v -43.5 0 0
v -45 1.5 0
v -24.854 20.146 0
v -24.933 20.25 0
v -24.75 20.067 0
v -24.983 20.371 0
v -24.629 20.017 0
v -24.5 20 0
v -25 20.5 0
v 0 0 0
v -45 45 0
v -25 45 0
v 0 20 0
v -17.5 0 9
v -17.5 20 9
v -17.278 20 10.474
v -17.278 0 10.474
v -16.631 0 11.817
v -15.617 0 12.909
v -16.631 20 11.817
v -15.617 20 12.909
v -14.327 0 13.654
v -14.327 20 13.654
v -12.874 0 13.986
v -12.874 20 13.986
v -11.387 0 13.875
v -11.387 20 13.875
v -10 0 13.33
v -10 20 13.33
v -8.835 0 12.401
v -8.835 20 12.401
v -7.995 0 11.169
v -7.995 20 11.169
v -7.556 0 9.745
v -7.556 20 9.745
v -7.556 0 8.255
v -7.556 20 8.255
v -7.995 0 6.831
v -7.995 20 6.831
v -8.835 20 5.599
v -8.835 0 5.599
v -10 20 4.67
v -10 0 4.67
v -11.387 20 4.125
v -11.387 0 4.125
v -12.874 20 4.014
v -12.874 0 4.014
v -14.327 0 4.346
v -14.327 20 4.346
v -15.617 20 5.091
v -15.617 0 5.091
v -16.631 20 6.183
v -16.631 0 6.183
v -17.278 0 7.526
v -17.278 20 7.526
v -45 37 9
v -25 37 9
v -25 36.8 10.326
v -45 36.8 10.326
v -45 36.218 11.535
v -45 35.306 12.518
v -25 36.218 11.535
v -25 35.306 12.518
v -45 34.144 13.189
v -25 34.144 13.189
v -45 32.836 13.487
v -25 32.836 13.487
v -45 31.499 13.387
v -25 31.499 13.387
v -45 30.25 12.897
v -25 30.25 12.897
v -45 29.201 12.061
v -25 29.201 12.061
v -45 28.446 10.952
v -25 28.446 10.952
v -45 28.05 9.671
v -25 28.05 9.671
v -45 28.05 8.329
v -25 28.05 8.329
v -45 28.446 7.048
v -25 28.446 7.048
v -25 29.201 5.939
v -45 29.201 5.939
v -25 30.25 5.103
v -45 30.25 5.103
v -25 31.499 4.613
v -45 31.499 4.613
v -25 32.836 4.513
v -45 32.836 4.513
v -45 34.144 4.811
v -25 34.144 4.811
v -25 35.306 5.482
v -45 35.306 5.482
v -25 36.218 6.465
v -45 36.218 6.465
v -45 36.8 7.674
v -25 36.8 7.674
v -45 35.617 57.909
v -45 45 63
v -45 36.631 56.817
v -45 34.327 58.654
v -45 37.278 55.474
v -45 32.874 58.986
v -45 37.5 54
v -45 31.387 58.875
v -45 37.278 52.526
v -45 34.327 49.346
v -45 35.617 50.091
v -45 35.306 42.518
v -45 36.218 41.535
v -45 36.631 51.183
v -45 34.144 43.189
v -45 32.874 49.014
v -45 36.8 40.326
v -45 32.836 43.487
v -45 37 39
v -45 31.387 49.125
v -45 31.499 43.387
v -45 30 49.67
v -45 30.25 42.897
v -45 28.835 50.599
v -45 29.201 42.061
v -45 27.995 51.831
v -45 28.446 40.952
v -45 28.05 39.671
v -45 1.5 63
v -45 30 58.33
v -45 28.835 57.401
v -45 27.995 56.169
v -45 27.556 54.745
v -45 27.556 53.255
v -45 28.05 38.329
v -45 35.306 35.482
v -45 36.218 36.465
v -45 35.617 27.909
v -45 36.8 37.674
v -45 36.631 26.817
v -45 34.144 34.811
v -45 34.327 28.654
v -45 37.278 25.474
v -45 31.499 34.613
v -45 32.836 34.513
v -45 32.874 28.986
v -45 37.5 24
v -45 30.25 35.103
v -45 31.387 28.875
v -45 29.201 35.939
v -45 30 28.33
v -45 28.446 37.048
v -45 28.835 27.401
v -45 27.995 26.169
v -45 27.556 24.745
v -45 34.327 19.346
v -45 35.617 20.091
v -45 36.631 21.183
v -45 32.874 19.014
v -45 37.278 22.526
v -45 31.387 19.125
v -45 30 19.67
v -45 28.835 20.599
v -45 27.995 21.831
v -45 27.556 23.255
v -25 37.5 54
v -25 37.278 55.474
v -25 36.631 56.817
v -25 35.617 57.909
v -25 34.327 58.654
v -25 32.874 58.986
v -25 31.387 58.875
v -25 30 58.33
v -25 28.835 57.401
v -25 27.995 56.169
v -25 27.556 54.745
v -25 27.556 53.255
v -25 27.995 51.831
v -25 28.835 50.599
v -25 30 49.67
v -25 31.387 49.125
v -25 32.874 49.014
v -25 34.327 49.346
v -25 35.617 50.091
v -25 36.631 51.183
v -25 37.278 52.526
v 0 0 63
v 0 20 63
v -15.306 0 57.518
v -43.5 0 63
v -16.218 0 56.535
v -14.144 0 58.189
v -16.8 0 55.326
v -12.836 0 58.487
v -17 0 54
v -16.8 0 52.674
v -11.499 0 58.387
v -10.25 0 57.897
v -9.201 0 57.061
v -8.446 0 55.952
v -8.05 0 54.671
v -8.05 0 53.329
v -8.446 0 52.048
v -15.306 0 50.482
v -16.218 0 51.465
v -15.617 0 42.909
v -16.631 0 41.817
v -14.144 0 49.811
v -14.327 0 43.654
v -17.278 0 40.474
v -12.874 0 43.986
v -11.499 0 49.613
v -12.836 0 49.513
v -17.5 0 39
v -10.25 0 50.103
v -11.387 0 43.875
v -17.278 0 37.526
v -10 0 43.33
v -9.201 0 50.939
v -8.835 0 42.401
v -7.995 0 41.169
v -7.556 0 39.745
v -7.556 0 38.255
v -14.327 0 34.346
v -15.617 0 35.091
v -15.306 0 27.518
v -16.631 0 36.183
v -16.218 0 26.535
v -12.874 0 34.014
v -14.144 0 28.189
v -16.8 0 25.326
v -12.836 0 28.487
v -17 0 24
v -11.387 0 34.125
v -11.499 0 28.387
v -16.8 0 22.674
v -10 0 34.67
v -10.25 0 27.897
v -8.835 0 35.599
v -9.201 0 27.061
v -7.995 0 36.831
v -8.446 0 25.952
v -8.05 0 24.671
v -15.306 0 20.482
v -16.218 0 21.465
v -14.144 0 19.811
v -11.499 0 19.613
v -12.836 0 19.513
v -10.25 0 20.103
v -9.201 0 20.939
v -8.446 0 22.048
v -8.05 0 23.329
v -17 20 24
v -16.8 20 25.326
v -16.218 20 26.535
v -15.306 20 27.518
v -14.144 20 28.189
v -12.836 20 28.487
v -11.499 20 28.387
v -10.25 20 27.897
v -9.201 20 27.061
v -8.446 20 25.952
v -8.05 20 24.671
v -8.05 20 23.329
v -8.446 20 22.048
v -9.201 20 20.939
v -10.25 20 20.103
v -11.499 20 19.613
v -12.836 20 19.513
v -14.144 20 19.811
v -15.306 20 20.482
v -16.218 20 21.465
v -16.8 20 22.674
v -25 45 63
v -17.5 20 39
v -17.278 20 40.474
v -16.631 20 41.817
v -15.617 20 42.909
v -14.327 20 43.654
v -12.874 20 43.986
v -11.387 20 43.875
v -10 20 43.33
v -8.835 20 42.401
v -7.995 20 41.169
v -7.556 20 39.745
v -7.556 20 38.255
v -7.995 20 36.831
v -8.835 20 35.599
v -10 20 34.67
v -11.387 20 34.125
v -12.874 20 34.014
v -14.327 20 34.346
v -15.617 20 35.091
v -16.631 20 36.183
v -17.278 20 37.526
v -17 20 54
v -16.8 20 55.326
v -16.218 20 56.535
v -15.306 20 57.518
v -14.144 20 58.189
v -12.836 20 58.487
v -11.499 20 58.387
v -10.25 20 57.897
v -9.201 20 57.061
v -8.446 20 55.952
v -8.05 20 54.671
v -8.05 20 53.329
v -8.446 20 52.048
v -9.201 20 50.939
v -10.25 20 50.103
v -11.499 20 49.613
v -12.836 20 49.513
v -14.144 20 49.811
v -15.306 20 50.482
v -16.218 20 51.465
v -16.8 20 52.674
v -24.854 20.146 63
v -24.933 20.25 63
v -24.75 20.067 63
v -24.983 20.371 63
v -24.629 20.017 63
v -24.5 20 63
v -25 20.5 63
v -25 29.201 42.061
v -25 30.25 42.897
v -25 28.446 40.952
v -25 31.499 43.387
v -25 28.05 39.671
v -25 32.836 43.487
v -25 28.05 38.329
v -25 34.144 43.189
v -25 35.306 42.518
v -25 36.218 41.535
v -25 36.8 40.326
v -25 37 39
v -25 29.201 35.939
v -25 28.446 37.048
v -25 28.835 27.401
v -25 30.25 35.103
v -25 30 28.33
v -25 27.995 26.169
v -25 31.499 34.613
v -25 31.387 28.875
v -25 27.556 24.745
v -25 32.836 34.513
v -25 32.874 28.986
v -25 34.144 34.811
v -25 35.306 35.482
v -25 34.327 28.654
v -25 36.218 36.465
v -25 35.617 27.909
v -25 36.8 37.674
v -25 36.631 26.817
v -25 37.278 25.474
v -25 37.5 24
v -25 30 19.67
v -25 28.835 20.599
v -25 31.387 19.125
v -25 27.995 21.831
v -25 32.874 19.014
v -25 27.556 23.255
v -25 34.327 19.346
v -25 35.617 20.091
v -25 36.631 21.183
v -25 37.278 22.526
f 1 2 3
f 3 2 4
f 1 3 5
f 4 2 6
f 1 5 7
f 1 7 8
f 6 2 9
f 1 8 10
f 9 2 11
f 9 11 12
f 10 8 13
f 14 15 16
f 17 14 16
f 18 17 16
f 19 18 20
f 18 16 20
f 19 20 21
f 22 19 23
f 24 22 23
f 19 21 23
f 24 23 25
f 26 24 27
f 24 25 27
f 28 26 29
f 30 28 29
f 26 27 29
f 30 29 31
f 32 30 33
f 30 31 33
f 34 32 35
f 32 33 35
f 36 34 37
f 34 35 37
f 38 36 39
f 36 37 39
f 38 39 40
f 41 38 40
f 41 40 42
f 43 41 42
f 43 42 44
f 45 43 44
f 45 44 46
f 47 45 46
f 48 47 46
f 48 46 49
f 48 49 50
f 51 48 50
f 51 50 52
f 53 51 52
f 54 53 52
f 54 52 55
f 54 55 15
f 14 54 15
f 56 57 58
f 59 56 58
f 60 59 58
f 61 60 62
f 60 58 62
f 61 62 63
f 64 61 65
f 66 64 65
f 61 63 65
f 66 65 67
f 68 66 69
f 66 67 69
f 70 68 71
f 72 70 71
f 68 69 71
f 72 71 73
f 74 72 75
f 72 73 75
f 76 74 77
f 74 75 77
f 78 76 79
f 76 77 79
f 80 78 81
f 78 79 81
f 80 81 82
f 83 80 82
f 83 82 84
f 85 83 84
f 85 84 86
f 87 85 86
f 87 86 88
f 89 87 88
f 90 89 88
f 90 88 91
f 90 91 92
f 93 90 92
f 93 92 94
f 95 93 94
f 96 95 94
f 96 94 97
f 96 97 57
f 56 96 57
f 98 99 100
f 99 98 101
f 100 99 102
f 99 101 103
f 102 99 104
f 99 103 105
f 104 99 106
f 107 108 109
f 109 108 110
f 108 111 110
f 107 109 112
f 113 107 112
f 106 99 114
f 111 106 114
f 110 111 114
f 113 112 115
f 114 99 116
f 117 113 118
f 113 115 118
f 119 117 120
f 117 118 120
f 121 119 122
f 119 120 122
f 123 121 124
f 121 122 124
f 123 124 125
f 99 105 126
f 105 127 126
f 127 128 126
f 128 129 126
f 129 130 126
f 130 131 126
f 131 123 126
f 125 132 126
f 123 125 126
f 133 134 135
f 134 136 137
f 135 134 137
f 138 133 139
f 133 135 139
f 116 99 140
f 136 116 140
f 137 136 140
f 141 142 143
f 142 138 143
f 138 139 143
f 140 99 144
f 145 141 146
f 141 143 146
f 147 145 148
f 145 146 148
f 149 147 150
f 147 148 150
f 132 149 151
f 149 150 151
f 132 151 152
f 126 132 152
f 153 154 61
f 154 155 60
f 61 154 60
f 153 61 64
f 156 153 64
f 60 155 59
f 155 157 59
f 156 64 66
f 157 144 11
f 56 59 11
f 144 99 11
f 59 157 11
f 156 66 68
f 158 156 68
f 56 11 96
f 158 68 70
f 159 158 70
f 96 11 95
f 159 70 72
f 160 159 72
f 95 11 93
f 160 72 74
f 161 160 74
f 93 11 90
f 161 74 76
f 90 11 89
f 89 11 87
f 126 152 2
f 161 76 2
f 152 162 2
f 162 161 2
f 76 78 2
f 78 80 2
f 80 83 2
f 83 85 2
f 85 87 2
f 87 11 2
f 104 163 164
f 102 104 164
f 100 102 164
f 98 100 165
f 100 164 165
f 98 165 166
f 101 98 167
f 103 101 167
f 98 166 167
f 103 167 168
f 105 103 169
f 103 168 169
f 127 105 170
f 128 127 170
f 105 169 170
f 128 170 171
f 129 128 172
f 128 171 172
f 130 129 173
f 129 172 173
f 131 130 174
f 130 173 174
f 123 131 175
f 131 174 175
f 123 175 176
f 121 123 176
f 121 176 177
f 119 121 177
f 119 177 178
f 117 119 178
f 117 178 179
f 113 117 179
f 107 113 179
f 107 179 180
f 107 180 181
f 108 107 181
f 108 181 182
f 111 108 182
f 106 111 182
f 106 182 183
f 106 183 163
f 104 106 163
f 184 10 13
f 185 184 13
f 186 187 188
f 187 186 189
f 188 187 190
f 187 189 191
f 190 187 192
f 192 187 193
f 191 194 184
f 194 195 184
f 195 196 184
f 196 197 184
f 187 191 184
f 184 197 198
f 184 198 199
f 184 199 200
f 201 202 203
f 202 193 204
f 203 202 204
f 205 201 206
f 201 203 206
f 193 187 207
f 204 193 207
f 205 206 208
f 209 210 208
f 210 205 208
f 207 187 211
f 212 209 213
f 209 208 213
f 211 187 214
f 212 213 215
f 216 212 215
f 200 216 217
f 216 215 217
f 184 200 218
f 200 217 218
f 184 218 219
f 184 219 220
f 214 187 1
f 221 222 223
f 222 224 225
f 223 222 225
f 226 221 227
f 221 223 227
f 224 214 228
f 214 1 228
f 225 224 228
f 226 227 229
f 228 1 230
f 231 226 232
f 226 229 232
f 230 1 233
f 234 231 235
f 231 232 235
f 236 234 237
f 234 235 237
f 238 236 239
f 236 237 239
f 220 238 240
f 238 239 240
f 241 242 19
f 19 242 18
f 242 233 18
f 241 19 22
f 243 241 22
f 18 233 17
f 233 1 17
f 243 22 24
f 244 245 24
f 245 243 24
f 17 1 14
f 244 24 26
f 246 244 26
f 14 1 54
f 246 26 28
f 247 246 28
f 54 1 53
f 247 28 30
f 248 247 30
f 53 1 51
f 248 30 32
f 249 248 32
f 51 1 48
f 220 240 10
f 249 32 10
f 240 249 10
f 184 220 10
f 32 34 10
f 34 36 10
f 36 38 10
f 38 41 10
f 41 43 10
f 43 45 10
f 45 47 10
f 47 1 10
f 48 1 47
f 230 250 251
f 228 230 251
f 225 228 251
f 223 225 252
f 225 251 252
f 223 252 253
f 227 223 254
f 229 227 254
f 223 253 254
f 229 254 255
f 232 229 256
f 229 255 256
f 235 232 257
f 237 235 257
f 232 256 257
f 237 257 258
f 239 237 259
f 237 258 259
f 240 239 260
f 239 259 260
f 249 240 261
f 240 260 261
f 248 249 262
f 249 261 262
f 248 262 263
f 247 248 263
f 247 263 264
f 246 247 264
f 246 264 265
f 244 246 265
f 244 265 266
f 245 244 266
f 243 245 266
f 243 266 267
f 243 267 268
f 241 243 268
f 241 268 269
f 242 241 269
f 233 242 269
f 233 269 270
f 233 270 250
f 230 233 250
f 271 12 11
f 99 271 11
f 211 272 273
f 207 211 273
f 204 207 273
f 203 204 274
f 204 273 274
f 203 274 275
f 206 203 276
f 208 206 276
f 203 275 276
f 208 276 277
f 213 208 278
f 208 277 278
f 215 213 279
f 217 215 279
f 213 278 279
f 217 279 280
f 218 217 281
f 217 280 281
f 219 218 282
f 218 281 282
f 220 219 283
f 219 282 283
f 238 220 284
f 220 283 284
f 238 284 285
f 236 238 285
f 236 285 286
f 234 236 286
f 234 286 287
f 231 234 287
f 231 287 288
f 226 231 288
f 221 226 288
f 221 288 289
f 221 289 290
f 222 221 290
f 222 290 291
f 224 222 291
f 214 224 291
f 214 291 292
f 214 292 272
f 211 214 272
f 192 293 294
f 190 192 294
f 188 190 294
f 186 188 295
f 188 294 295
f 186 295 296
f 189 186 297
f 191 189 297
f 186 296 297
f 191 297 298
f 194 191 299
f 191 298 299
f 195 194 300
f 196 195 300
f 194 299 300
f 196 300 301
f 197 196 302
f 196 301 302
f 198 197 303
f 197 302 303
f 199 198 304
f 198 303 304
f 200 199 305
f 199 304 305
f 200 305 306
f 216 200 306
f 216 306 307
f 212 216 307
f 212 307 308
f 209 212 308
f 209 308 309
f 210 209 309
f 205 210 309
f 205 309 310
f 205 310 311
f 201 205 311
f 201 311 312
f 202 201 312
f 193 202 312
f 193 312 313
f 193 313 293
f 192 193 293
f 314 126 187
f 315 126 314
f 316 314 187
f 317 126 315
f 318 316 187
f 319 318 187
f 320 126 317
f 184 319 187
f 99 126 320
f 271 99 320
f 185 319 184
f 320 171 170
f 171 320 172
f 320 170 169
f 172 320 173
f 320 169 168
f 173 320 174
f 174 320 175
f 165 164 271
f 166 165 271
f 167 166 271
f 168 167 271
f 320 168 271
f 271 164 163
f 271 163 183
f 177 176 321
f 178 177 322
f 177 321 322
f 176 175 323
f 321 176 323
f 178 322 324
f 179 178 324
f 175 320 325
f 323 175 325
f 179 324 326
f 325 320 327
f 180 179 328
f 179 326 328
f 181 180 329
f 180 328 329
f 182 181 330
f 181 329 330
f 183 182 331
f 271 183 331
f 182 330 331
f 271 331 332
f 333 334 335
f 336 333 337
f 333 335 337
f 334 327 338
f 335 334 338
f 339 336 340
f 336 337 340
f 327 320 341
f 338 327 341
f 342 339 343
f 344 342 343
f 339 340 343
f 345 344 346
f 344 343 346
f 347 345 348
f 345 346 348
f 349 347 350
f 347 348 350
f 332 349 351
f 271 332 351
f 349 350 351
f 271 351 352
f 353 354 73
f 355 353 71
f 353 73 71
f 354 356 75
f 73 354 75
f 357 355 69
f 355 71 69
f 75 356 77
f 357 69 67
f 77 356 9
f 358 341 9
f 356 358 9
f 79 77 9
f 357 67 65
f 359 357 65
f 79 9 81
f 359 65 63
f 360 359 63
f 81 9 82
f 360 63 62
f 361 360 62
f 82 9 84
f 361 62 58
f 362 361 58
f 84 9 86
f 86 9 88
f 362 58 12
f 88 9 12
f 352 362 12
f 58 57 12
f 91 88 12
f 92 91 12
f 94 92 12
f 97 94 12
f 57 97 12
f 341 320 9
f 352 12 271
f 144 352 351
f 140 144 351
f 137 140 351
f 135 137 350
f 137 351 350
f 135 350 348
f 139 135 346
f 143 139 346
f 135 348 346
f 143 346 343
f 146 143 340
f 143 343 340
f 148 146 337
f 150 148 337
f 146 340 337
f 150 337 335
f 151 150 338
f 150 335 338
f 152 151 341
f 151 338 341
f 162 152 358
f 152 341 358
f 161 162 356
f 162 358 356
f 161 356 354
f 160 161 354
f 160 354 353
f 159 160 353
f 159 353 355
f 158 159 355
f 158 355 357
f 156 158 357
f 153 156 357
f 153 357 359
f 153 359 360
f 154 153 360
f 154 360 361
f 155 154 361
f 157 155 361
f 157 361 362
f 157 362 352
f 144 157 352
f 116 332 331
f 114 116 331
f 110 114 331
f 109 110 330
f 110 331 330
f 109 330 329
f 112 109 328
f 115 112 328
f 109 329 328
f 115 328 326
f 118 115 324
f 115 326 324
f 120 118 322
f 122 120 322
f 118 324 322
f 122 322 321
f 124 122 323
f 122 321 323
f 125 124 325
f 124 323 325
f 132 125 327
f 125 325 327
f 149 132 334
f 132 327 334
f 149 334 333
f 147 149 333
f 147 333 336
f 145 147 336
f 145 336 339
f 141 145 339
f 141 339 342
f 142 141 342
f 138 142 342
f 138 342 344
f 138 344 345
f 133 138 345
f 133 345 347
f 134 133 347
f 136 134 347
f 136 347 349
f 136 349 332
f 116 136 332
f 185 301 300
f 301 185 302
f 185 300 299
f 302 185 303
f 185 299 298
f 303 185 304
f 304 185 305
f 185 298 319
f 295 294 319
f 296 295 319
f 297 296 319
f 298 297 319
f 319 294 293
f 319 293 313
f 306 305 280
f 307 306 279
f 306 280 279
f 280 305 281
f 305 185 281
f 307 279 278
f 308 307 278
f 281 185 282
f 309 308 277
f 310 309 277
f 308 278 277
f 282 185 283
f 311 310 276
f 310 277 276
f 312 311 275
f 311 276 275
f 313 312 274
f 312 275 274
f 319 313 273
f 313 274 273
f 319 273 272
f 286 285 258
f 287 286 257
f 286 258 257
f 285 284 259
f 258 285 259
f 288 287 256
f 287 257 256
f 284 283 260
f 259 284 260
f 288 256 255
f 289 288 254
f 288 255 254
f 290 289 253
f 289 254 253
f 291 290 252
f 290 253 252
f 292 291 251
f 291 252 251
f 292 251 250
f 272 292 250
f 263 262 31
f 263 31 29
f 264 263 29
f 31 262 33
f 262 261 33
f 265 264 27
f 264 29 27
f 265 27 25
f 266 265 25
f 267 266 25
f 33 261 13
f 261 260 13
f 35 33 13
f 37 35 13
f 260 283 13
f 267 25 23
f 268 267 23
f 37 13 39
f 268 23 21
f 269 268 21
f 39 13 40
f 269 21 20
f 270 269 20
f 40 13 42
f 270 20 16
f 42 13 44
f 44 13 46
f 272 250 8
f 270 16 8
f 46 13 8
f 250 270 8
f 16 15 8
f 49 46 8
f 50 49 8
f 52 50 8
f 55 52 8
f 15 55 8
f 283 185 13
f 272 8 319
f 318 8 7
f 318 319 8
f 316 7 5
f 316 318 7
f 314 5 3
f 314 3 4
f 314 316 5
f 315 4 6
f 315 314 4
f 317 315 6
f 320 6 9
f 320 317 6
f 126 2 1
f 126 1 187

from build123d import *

# Parameters (mm, degrees)
F1_DEPTH = 63
F2_R     = 4.5
F2_R_2   = 5
F3_DEPTH = 25
F4_R     = 4.5
F4_R_2   = 5
F5_DEPTH = 25
F6_R     = 0.5
F7_SIZE  = 1.5


with BuildPart() as f1:
    # F0 (on Top) → F1 (new body)
    with BuildSketch(Plane.XY):
        Polygon((-45, 0), (0, 0), (0, 20), (-25, 20), (-25, 45), (-45, 45), align=None)
    extrude(amount=F1_DEPTH)

    # F2 (on face) → F3 (cut)
    with BuildSketch(Plane.YZ.offset(-25)):
        with Locations((32.5, 39)):
            Circle(F2_R)
        with Locations((32.5, 24)):
            Circle(F2_R_2)
        with Locations((32.5, 9)):
            Circle(F2_R)
        with Locations((32.5, 54)):
            Circle(F2_R_2)
    extrude(amount=-F3_DEPTH, mode=Mode.SUBTRACT)

    # F4 (on face) → F5 (cut)
    with BuildSketch(Plane(origin=(0, 20, 0), x_dir=(-1, 0, 0), z_dir=(0, 1, 0))):
        with Locations((12.5, 54)):
            Circle(F4_R)
        with Locations((12.5, 39)):
            Circle(F4_R_2)
        with Locations((12.5, 24)):
            Circle(F4_R)
        with Locations((12.5, 9)):
            Circle(F4_R_2)
    extrude(amount=-F5_DEPTH, mode=Mode.SUBTRACT)

    # F6
    f6_edges = [f1.edges().sort_by_distance(p)[0] for p in [
        (-25, 20, 31.5),
    ]]
    fillet(f6_edges, radius=F6_R)

    # F7
    f7_edges = [f1.edges().sort_by_distance(p)[0] for p in [
        (-45, 0, 31.5),
    ]]
    chamfer(f7_edges, length=F7_SIZE)


solid = f1.part
